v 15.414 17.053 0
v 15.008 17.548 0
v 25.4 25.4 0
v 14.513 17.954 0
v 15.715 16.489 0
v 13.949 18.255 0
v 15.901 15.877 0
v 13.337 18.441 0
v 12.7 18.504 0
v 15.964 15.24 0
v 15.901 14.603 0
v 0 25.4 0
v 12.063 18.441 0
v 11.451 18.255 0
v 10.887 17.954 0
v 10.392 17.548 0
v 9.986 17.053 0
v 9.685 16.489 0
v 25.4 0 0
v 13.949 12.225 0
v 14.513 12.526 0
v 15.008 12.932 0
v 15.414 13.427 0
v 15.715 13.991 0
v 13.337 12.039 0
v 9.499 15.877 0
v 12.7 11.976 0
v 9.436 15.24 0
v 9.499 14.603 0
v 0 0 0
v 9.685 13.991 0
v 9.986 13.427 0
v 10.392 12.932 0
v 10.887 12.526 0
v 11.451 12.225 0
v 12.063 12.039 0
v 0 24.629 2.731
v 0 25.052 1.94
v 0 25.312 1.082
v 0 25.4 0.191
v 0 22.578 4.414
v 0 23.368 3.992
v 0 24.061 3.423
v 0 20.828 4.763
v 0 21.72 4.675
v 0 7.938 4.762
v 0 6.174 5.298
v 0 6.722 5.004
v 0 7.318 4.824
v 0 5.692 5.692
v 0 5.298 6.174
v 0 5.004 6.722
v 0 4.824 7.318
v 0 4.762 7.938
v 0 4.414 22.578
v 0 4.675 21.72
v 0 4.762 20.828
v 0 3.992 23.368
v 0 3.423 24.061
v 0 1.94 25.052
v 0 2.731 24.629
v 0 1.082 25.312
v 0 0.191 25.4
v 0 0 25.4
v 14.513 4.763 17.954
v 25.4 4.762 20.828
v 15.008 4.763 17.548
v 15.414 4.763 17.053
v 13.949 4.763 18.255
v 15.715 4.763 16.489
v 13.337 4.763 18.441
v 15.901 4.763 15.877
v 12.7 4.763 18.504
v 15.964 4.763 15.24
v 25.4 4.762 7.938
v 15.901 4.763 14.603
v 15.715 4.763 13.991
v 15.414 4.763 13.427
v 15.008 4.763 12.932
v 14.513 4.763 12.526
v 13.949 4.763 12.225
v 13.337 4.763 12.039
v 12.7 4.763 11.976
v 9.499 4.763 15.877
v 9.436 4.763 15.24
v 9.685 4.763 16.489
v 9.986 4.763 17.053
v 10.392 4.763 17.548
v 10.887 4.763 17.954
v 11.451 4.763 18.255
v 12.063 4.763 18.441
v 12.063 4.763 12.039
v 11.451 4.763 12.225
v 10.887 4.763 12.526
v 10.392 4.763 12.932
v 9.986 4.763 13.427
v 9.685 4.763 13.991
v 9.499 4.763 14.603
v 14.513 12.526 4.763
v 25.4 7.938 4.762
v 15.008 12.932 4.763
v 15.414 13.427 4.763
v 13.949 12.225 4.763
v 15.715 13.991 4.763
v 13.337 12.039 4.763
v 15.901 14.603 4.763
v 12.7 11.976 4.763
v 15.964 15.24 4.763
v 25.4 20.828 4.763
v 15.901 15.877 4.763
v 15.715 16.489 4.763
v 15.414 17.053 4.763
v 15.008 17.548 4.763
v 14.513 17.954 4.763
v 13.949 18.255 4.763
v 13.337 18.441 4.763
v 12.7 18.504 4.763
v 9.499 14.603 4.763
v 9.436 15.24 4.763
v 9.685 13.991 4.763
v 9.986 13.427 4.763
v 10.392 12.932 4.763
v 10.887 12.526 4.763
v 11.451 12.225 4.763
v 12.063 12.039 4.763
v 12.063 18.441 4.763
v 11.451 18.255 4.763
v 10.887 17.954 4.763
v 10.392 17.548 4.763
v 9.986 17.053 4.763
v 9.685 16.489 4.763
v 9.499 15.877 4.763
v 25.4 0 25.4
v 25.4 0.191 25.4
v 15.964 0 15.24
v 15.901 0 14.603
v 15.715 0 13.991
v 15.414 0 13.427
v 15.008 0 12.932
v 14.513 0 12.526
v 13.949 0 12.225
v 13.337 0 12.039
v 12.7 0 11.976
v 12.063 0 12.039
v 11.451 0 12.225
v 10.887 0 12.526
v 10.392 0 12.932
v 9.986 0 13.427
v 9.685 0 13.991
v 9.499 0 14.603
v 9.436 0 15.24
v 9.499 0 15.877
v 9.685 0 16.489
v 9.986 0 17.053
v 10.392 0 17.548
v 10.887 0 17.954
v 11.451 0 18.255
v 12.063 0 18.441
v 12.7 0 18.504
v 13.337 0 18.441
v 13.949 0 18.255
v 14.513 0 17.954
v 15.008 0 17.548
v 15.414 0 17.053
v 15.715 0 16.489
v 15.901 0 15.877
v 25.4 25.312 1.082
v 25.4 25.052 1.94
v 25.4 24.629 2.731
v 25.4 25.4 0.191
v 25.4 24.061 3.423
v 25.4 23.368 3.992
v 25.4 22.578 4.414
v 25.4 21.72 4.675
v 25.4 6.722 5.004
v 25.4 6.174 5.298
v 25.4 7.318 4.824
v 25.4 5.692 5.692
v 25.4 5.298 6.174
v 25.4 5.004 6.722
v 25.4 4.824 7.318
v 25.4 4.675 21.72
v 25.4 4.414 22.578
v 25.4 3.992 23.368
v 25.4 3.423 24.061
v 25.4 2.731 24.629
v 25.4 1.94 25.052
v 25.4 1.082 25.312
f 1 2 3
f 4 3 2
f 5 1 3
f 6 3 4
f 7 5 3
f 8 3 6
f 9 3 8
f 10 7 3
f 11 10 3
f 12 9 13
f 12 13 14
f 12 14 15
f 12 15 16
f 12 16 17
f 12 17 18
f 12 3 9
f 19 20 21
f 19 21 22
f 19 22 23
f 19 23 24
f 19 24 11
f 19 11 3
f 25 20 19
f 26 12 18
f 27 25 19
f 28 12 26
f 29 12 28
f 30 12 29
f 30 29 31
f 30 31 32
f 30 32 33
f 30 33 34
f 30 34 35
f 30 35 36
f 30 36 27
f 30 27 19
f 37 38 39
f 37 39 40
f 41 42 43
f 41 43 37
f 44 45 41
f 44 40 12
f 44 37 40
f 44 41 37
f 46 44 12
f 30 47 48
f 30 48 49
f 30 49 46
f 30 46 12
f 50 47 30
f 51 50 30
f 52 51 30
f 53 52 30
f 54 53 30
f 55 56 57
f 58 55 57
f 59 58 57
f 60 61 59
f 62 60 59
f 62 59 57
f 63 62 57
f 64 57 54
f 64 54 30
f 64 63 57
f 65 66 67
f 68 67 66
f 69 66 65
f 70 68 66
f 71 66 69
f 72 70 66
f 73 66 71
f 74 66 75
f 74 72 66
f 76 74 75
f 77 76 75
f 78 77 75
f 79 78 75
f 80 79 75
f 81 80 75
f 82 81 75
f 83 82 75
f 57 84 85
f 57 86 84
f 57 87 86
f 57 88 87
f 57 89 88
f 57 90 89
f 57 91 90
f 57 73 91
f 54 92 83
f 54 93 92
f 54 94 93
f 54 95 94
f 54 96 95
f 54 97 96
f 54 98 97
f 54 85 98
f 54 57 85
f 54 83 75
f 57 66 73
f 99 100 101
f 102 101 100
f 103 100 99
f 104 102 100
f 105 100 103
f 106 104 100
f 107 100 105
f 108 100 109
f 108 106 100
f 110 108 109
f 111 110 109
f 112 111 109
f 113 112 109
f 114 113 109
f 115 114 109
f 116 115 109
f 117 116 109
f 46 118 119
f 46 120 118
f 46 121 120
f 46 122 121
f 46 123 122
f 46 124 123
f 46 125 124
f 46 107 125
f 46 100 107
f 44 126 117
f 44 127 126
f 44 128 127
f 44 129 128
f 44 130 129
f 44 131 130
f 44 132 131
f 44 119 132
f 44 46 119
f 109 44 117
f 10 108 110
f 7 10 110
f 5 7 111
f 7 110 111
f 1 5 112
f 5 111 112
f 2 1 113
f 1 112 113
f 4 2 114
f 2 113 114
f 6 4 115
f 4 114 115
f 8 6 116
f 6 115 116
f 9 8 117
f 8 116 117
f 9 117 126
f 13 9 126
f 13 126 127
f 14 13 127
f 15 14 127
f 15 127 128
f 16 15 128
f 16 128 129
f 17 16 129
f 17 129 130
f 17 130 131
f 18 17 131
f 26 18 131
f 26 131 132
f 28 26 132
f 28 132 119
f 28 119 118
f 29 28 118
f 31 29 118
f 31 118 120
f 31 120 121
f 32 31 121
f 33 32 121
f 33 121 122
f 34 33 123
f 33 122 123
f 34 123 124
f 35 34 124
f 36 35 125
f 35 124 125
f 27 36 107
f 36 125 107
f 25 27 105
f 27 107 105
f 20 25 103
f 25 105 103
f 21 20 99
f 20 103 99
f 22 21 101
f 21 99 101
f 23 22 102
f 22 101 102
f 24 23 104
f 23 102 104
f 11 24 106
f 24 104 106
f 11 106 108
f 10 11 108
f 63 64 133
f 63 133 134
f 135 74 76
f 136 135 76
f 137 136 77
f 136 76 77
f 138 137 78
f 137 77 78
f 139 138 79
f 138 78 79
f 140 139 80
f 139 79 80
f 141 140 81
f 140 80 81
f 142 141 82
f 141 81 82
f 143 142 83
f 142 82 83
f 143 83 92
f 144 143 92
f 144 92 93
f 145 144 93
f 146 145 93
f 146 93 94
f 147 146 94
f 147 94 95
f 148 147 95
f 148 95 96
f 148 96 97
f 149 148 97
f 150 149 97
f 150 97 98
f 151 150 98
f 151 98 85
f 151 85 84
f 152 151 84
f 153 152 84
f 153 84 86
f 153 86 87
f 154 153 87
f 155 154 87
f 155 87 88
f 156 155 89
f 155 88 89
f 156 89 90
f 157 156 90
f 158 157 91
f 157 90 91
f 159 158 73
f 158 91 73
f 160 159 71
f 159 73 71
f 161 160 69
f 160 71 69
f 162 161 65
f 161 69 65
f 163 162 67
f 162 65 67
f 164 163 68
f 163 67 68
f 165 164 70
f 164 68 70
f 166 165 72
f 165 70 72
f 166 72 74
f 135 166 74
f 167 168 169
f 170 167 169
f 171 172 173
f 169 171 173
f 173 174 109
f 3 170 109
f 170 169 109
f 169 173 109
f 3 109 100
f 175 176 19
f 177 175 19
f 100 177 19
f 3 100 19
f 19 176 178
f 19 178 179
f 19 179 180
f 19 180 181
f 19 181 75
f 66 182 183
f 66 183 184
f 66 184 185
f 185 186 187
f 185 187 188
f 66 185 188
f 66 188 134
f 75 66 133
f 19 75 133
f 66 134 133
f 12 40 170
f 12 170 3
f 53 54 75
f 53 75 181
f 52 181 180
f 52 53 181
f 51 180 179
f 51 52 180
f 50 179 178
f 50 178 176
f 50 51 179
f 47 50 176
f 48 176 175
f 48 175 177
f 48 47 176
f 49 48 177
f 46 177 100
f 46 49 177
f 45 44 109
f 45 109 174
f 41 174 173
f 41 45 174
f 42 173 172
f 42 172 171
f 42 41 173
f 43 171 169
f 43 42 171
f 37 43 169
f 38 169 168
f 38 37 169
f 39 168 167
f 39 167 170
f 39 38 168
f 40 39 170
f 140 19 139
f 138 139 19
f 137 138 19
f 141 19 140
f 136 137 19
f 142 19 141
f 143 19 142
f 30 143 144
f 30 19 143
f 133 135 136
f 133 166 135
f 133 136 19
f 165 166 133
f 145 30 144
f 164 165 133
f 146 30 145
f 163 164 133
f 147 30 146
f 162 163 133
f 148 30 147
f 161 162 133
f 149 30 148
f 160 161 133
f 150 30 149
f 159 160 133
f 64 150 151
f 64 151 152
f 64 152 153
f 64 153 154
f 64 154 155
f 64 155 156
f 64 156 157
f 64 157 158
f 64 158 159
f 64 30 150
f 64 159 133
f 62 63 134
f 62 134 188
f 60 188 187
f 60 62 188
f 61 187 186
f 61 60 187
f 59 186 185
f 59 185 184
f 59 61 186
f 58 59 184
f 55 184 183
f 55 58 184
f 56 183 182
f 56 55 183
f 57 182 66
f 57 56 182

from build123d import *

# Parameters (mm, degrees)
BOSS_EXTRUDE1_DEPTH     = 25.4
F_1_4_CLEARANCE_HOLE1_D = 6.5278
F_1_4_CLEARANCE_HOLE2_D = 6.5278


with BuildPart() as part:
    # Sketch1 → Boss-Extrude1 (new body)
    with BuildSketch(Plane(origin=(0, -22.225, 0), x_dir=(0, -1, 0), z_dir=(-1, 0, 0))):
        with BuildLine():
            Line((-22.225, 0), (-22.225, 25.4))
            Line((-22.225, 25.4), (-22.4155, 25.4))
            ThreePointArc((-22.4155, 25.4), (-25.648392204, 24.060892204), (-26.9875, 20.828))
            Line((-26.9875, 20.828), (-26.9875, 7.9375))
            ThreePointArc((-26.9875, 7.9375), (-27.91743597, 5.69243597), (-30.1625, 4.7625))
            Line((-30.1625, 4.7625), (-43.053, 4.7625))
            ThreePointArc((-43.053, 4.7625), (-46.285892204, 3.423392204), (-47.625, 0.1905))
            Line((-47.625, 0.1905), (-47.625, 0))
            Line((-47.625, 0), (-22.225, 0))
        make_face()
    extrude(amount=-BOSS_EXTRUDE1_DEPTH)

    # 1/4 Clearance Hole1 (through all)
    with Locations(Plane(origin=(0, 0, 0), x_dir=(-1, 0, 0), z_dir=(0, 0, -1))):
        with Locations((-12.7, 15.24)):
            Hole(F_1_4_CLEARANCE_HOLE1_D / 2)

    # 1/4 Clearance Hole2 (through all)
    with Locations(Plane(origin=(0, 0, 0), x_dir=(-1, 0, 0), z_dir=(0, -1, 0))):
        with Locations((-12.7, -15.24)):
            Hole(F_1_4_CLEARANCE_HOLE2_D / 2)


solid = part.part
